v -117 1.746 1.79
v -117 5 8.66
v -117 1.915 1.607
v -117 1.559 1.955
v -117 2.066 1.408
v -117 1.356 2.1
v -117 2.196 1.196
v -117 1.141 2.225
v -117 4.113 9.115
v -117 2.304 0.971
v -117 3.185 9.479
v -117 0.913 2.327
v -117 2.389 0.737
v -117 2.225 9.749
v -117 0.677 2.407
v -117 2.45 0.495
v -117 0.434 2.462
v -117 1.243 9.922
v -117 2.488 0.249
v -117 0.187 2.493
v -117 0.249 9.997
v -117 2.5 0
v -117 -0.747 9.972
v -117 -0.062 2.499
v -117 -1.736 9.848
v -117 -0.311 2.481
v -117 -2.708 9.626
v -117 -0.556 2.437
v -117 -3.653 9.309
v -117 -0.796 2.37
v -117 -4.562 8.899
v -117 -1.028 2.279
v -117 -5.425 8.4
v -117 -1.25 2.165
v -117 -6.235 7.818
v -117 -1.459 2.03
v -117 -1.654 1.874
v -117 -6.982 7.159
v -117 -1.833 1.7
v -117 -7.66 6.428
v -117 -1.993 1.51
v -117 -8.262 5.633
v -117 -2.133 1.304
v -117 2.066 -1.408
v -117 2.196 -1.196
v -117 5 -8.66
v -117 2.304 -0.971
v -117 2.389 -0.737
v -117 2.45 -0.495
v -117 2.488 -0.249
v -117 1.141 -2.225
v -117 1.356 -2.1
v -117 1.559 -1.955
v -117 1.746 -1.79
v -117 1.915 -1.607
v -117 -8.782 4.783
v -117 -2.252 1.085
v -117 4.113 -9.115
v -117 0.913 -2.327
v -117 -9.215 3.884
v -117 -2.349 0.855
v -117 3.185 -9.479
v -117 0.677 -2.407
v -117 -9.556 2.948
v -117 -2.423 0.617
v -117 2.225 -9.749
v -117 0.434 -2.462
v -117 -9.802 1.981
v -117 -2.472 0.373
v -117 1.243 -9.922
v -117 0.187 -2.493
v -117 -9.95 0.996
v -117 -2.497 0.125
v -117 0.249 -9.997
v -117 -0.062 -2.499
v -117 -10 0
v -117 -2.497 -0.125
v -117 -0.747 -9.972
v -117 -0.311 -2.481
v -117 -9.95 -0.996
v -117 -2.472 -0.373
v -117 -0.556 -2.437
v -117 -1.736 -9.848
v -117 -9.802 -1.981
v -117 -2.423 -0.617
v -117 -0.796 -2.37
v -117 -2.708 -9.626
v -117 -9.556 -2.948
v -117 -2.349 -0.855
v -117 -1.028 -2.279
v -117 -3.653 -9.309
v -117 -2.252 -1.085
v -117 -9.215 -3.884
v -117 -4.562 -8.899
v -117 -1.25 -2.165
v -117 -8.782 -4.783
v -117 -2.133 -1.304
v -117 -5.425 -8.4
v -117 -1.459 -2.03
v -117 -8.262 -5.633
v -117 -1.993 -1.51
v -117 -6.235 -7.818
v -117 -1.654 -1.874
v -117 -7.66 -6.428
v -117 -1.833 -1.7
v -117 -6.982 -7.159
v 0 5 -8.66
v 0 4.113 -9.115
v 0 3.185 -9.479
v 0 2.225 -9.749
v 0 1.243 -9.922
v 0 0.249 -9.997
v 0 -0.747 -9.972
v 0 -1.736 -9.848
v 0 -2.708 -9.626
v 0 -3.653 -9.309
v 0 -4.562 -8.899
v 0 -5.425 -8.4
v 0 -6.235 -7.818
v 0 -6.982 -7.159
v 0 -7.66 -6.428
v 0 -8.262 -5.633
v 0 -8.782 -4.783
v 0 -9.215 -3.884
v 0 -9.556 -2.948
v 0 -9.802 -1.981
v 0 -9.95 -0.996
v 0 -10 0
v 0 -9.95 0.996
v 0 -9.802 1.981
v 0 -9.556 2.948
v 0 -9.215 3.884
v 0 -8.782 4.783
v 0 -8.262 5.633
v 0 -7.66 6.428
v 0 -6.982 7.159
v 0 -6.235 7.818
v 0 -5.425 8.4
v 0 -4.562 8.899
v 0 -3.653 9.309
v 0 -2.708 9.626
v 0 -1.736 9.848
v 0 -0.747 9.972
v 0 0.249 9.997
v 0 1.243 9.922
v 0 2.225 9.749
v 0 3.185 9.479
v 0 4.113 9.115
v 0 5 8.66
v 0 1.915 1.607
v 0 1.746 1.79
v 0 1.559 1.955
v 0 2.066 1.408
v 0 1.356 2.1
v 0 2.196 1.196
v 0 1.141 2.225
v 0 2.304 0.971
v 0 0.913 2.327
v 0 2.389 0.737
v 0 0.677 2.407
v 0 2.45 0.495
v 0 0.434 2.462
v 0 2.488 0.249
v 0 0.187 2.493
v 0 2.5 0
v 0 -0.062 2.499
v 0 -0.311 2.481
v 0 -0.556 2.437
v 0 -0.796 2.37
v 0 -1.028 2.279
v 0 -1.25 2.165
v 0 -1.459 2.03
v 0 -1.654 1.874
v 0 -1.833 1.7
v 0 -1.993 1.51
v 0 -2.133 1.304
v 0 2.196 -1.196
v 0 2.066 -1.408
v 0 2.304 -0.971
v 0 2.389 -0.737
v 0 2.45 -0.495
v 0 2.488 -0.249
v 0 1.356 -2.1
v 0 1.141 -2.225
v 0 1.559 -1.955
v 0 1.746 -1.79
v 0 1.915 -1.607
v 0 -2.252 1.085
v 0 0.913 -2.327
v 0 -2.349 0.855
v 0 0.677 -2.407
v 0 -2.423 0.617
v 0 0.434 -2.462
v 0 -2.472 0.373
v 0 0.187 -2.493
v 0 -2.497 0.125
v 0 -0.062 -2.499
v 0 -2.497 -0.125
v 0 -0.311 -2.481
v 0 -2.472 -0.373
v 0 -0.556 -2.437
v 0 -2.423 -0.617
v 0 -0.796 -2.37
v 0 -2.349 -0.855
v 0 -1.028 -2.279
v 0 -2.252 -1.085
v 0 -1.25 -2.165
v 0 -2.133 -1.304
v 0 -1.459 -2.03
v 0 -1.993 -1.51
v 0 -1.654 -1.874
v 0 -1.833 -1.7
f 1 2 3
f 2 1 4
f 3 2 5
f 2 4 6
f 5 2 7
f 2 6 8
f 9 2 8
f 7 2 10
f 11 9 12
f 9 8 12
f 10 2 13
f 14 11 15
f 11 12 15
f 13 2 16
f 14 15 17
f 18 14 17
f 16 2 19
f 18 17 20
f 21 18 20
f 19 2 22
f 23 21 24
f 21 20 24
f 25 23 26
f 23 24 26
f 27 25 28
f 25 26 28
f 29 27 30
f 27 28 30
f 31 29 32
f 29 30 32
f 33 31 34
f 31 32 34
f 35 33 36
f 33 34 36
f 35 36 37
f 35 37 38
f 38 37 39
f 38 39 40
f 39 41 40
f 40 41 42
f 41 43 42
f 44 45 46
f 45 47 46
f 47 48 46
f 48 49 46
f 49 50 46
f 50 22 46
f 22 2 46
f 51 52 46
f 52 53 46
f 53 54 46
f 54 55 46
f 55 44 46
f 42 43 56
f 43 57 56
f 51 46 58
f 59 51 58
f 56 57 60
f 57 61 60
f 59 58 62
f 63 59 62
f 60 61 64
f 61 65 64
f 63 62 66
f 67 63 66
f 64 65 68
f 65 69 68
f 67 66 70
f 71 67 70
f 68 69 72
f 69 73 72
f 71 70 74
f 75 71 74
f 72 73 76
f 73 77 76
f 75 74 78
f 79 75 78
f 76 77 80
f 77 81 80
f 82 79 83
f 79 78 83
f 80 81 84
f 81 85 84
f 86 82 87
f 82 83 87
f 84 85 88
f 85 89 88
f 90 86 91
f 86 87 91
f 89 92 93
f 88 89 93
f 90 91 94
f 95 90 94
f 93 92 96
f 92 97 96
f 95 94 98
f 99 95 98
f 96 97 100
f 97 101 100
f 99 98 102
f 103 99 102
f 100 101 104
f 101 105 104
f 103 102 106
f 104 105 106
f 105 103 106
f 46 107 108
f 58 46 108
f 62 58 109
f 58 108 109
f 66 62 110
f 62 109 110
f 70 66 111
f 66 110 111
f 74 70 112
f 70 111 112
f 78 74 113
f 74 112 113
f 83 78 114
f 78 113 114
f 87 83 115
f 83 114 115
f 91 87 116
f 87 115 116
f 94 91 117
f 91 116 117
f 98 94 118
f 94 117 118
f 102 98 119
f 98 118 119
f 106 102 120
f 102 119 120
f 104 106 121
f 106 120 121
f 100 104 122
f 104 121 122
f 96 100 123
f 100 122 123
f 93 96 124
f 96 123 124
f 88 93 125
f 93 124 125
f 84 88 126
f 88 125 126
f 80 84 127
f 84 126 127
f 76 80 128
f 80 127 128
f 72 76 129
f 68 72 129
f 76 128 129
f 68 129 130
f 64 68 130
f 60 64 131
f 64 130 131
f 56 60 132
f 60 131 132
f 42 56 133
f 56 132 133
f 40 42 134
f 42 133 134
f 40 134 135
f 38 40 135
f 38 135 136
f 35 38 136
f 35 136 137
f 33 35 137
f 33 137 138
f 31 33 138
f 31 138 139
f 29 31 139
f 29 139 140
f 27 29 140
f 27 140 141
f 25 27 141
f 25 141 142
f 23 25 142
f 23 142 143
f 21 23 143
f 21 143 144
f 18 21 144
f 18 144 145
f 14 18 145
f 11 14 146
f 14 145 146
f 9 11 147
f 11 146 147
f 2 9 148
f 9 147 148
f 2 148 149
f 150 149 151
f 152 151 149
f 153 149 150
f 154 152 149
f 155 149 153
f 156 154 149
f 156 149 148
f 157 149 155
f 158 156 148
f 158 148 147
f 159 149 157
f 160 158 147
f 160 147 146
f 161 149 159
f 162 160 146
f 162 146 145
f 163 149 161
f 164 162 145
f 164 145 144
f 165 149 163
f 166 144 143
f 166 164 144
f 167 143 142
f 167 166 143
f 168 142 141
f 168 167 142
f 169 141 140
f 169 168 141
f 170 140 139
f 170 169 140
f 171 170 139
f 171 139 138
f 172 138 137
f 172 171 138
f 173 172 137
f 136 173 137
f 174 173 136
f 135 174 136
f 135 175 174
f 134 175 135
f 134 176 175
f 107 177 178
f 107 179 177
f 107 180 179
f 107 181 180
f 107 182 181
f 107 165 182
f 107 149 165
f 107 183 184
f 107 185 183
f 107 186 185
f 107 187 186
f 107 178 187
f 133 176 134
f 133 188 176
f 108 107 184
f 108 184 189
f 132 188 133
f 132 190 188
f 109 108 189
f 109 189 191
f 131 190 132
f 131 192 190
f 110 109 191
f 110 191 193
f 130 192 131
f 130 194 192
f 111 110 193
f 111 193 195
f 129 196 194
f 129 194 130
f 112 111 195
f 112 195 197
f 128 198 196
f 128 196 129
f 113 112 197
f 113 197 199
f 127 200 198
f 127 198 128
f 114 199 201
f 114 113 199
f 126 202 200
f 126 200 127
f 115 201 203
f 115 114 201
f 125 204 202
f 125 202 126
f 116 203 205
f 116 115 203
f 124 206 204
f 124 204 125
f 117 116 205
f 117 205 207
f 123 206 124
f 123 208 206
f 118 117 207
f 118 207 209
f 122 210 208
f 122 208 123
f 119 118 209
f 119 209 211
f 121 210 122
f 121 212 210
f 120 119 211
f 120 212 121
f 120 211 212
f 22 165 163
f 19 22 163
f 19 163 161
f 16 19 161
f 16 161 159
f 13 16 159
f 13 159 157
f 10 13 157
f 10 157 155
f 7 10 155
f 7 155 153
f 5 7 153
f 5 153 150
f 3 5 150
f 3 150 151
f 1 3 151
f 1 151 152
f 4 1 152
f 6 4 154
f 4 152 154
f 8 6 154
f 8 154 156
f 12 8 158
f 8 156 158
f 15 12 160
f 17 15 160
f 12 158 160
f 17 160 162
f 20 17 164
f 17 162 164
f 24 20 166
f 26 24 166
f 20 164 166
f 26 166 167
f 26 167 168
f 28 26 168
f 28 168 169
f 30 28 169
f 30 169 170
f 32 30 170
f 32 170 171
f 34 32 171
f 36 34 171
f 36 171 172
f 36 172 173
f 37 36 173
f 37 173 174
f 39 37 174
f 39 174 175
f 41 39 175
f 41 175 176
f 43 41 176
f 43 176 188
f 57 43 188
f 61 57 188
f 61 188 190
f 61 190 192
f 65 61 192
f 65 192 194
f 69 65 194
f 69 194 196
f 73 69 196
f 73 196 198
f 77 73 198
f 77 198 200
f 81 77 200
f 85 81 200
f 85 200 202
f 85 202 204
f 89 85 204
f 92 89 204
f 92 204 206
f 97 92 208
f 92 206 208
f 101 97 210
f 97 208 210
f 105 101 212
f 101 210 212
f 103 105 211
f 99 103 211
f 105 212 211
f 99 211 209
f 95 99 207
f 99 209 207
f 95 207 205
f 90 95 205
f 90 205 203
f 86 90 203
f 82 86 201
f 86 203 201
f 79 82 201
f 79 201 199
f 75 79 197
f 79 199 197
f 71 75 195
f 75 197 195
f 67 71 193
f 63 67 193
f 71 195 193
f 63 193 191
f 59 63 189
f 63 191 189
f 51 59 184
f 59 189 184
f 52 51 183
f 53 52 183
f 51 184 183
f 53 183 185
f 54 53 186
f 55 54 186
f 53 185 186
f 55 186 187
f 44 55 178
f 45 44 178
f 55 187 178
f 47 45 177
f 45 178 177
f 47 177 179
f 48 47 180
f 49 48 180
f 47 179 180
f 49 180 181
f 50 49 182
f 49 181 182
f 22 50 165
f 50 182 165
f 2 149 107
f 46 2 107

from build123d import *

# Parameters (mm, degrees)
ESQUISSE1_W             = 117
ESQUISSE1_H             = 10
ENL_V_MAT_EXTRU_1_REACH = 119.852
ESQUISSE2_R             = 2.5
ENL_V_MAT_EXTRU_2_REACH = 119.852
ESQUISSE3_W             = 20
ESQUISSE3_H             = 5


with BuildPart() as part:
    # Esquisse1 → Révolution1 (revolve)
    with BuildSketch(Plane.XY):
        with Locations((-58.5, 5)):
            Rectangle(ESQUISSE1_W, ESQUISSE1_H)
    revolve(axis=Axis((0, 0, 0), (-1, 0, 0)))

    # Esquisse2 → Enlèv. mat.-Extru.1 (cut, up to next)
    with BuildSketch(Plane(origin=(0, 0, 0), x_dir=(0, 0, -1), z_dir=(1, 0, 0)), mode=Mode.PRIVATE) as enl_v_mat_extru_1_sk1:
        with Locations(Location((0, 0, 0), (0, 0, 90))):
            Circle(ESQUISSE2_R)
    enl_v_mat_extru_1_tool1 = extrude(enl_v_mat_extru_1_sk1.sketch, amount=-ENL_V_MAT_EXTRU_1_REACH, mode=Mode.PRIVATE) & part.part
    add(enl_v_mat_extru_1_tool1.solids().sort_by_distance((0, 0, 0))[0], mode=Mode.SUBTRACT)

    # Esquisse3 → Enlèv. mat.-Extru.2 (cut, up to next)
    with BuildSketch(Plane(origin=(0, 0, 0), x_dir=(0, 0, -1), z_dir=(1, 0, 0)), mode=Mode.PRIVATE) as enl_v_mat_extru_2_sk1:
        with Locations((0, 7.5)):
            Rectangle(ESQUISSE3_W, ESQUISSE3_H)
    enl_v_mat_extru_2_tool1 = extrude(enl_v_mat_extru_2_sk1.sketch, amount=-ENL_V_MAT_EXTRU_2_REACH, mode=Mode.PRIVATE) & part.part
    add(enl_v_mat_extru_2_tool1.solids().sort_by_distance((0, 7.5, 0))[0], mode=Mode.SUBTRACT)


solid = part.part
